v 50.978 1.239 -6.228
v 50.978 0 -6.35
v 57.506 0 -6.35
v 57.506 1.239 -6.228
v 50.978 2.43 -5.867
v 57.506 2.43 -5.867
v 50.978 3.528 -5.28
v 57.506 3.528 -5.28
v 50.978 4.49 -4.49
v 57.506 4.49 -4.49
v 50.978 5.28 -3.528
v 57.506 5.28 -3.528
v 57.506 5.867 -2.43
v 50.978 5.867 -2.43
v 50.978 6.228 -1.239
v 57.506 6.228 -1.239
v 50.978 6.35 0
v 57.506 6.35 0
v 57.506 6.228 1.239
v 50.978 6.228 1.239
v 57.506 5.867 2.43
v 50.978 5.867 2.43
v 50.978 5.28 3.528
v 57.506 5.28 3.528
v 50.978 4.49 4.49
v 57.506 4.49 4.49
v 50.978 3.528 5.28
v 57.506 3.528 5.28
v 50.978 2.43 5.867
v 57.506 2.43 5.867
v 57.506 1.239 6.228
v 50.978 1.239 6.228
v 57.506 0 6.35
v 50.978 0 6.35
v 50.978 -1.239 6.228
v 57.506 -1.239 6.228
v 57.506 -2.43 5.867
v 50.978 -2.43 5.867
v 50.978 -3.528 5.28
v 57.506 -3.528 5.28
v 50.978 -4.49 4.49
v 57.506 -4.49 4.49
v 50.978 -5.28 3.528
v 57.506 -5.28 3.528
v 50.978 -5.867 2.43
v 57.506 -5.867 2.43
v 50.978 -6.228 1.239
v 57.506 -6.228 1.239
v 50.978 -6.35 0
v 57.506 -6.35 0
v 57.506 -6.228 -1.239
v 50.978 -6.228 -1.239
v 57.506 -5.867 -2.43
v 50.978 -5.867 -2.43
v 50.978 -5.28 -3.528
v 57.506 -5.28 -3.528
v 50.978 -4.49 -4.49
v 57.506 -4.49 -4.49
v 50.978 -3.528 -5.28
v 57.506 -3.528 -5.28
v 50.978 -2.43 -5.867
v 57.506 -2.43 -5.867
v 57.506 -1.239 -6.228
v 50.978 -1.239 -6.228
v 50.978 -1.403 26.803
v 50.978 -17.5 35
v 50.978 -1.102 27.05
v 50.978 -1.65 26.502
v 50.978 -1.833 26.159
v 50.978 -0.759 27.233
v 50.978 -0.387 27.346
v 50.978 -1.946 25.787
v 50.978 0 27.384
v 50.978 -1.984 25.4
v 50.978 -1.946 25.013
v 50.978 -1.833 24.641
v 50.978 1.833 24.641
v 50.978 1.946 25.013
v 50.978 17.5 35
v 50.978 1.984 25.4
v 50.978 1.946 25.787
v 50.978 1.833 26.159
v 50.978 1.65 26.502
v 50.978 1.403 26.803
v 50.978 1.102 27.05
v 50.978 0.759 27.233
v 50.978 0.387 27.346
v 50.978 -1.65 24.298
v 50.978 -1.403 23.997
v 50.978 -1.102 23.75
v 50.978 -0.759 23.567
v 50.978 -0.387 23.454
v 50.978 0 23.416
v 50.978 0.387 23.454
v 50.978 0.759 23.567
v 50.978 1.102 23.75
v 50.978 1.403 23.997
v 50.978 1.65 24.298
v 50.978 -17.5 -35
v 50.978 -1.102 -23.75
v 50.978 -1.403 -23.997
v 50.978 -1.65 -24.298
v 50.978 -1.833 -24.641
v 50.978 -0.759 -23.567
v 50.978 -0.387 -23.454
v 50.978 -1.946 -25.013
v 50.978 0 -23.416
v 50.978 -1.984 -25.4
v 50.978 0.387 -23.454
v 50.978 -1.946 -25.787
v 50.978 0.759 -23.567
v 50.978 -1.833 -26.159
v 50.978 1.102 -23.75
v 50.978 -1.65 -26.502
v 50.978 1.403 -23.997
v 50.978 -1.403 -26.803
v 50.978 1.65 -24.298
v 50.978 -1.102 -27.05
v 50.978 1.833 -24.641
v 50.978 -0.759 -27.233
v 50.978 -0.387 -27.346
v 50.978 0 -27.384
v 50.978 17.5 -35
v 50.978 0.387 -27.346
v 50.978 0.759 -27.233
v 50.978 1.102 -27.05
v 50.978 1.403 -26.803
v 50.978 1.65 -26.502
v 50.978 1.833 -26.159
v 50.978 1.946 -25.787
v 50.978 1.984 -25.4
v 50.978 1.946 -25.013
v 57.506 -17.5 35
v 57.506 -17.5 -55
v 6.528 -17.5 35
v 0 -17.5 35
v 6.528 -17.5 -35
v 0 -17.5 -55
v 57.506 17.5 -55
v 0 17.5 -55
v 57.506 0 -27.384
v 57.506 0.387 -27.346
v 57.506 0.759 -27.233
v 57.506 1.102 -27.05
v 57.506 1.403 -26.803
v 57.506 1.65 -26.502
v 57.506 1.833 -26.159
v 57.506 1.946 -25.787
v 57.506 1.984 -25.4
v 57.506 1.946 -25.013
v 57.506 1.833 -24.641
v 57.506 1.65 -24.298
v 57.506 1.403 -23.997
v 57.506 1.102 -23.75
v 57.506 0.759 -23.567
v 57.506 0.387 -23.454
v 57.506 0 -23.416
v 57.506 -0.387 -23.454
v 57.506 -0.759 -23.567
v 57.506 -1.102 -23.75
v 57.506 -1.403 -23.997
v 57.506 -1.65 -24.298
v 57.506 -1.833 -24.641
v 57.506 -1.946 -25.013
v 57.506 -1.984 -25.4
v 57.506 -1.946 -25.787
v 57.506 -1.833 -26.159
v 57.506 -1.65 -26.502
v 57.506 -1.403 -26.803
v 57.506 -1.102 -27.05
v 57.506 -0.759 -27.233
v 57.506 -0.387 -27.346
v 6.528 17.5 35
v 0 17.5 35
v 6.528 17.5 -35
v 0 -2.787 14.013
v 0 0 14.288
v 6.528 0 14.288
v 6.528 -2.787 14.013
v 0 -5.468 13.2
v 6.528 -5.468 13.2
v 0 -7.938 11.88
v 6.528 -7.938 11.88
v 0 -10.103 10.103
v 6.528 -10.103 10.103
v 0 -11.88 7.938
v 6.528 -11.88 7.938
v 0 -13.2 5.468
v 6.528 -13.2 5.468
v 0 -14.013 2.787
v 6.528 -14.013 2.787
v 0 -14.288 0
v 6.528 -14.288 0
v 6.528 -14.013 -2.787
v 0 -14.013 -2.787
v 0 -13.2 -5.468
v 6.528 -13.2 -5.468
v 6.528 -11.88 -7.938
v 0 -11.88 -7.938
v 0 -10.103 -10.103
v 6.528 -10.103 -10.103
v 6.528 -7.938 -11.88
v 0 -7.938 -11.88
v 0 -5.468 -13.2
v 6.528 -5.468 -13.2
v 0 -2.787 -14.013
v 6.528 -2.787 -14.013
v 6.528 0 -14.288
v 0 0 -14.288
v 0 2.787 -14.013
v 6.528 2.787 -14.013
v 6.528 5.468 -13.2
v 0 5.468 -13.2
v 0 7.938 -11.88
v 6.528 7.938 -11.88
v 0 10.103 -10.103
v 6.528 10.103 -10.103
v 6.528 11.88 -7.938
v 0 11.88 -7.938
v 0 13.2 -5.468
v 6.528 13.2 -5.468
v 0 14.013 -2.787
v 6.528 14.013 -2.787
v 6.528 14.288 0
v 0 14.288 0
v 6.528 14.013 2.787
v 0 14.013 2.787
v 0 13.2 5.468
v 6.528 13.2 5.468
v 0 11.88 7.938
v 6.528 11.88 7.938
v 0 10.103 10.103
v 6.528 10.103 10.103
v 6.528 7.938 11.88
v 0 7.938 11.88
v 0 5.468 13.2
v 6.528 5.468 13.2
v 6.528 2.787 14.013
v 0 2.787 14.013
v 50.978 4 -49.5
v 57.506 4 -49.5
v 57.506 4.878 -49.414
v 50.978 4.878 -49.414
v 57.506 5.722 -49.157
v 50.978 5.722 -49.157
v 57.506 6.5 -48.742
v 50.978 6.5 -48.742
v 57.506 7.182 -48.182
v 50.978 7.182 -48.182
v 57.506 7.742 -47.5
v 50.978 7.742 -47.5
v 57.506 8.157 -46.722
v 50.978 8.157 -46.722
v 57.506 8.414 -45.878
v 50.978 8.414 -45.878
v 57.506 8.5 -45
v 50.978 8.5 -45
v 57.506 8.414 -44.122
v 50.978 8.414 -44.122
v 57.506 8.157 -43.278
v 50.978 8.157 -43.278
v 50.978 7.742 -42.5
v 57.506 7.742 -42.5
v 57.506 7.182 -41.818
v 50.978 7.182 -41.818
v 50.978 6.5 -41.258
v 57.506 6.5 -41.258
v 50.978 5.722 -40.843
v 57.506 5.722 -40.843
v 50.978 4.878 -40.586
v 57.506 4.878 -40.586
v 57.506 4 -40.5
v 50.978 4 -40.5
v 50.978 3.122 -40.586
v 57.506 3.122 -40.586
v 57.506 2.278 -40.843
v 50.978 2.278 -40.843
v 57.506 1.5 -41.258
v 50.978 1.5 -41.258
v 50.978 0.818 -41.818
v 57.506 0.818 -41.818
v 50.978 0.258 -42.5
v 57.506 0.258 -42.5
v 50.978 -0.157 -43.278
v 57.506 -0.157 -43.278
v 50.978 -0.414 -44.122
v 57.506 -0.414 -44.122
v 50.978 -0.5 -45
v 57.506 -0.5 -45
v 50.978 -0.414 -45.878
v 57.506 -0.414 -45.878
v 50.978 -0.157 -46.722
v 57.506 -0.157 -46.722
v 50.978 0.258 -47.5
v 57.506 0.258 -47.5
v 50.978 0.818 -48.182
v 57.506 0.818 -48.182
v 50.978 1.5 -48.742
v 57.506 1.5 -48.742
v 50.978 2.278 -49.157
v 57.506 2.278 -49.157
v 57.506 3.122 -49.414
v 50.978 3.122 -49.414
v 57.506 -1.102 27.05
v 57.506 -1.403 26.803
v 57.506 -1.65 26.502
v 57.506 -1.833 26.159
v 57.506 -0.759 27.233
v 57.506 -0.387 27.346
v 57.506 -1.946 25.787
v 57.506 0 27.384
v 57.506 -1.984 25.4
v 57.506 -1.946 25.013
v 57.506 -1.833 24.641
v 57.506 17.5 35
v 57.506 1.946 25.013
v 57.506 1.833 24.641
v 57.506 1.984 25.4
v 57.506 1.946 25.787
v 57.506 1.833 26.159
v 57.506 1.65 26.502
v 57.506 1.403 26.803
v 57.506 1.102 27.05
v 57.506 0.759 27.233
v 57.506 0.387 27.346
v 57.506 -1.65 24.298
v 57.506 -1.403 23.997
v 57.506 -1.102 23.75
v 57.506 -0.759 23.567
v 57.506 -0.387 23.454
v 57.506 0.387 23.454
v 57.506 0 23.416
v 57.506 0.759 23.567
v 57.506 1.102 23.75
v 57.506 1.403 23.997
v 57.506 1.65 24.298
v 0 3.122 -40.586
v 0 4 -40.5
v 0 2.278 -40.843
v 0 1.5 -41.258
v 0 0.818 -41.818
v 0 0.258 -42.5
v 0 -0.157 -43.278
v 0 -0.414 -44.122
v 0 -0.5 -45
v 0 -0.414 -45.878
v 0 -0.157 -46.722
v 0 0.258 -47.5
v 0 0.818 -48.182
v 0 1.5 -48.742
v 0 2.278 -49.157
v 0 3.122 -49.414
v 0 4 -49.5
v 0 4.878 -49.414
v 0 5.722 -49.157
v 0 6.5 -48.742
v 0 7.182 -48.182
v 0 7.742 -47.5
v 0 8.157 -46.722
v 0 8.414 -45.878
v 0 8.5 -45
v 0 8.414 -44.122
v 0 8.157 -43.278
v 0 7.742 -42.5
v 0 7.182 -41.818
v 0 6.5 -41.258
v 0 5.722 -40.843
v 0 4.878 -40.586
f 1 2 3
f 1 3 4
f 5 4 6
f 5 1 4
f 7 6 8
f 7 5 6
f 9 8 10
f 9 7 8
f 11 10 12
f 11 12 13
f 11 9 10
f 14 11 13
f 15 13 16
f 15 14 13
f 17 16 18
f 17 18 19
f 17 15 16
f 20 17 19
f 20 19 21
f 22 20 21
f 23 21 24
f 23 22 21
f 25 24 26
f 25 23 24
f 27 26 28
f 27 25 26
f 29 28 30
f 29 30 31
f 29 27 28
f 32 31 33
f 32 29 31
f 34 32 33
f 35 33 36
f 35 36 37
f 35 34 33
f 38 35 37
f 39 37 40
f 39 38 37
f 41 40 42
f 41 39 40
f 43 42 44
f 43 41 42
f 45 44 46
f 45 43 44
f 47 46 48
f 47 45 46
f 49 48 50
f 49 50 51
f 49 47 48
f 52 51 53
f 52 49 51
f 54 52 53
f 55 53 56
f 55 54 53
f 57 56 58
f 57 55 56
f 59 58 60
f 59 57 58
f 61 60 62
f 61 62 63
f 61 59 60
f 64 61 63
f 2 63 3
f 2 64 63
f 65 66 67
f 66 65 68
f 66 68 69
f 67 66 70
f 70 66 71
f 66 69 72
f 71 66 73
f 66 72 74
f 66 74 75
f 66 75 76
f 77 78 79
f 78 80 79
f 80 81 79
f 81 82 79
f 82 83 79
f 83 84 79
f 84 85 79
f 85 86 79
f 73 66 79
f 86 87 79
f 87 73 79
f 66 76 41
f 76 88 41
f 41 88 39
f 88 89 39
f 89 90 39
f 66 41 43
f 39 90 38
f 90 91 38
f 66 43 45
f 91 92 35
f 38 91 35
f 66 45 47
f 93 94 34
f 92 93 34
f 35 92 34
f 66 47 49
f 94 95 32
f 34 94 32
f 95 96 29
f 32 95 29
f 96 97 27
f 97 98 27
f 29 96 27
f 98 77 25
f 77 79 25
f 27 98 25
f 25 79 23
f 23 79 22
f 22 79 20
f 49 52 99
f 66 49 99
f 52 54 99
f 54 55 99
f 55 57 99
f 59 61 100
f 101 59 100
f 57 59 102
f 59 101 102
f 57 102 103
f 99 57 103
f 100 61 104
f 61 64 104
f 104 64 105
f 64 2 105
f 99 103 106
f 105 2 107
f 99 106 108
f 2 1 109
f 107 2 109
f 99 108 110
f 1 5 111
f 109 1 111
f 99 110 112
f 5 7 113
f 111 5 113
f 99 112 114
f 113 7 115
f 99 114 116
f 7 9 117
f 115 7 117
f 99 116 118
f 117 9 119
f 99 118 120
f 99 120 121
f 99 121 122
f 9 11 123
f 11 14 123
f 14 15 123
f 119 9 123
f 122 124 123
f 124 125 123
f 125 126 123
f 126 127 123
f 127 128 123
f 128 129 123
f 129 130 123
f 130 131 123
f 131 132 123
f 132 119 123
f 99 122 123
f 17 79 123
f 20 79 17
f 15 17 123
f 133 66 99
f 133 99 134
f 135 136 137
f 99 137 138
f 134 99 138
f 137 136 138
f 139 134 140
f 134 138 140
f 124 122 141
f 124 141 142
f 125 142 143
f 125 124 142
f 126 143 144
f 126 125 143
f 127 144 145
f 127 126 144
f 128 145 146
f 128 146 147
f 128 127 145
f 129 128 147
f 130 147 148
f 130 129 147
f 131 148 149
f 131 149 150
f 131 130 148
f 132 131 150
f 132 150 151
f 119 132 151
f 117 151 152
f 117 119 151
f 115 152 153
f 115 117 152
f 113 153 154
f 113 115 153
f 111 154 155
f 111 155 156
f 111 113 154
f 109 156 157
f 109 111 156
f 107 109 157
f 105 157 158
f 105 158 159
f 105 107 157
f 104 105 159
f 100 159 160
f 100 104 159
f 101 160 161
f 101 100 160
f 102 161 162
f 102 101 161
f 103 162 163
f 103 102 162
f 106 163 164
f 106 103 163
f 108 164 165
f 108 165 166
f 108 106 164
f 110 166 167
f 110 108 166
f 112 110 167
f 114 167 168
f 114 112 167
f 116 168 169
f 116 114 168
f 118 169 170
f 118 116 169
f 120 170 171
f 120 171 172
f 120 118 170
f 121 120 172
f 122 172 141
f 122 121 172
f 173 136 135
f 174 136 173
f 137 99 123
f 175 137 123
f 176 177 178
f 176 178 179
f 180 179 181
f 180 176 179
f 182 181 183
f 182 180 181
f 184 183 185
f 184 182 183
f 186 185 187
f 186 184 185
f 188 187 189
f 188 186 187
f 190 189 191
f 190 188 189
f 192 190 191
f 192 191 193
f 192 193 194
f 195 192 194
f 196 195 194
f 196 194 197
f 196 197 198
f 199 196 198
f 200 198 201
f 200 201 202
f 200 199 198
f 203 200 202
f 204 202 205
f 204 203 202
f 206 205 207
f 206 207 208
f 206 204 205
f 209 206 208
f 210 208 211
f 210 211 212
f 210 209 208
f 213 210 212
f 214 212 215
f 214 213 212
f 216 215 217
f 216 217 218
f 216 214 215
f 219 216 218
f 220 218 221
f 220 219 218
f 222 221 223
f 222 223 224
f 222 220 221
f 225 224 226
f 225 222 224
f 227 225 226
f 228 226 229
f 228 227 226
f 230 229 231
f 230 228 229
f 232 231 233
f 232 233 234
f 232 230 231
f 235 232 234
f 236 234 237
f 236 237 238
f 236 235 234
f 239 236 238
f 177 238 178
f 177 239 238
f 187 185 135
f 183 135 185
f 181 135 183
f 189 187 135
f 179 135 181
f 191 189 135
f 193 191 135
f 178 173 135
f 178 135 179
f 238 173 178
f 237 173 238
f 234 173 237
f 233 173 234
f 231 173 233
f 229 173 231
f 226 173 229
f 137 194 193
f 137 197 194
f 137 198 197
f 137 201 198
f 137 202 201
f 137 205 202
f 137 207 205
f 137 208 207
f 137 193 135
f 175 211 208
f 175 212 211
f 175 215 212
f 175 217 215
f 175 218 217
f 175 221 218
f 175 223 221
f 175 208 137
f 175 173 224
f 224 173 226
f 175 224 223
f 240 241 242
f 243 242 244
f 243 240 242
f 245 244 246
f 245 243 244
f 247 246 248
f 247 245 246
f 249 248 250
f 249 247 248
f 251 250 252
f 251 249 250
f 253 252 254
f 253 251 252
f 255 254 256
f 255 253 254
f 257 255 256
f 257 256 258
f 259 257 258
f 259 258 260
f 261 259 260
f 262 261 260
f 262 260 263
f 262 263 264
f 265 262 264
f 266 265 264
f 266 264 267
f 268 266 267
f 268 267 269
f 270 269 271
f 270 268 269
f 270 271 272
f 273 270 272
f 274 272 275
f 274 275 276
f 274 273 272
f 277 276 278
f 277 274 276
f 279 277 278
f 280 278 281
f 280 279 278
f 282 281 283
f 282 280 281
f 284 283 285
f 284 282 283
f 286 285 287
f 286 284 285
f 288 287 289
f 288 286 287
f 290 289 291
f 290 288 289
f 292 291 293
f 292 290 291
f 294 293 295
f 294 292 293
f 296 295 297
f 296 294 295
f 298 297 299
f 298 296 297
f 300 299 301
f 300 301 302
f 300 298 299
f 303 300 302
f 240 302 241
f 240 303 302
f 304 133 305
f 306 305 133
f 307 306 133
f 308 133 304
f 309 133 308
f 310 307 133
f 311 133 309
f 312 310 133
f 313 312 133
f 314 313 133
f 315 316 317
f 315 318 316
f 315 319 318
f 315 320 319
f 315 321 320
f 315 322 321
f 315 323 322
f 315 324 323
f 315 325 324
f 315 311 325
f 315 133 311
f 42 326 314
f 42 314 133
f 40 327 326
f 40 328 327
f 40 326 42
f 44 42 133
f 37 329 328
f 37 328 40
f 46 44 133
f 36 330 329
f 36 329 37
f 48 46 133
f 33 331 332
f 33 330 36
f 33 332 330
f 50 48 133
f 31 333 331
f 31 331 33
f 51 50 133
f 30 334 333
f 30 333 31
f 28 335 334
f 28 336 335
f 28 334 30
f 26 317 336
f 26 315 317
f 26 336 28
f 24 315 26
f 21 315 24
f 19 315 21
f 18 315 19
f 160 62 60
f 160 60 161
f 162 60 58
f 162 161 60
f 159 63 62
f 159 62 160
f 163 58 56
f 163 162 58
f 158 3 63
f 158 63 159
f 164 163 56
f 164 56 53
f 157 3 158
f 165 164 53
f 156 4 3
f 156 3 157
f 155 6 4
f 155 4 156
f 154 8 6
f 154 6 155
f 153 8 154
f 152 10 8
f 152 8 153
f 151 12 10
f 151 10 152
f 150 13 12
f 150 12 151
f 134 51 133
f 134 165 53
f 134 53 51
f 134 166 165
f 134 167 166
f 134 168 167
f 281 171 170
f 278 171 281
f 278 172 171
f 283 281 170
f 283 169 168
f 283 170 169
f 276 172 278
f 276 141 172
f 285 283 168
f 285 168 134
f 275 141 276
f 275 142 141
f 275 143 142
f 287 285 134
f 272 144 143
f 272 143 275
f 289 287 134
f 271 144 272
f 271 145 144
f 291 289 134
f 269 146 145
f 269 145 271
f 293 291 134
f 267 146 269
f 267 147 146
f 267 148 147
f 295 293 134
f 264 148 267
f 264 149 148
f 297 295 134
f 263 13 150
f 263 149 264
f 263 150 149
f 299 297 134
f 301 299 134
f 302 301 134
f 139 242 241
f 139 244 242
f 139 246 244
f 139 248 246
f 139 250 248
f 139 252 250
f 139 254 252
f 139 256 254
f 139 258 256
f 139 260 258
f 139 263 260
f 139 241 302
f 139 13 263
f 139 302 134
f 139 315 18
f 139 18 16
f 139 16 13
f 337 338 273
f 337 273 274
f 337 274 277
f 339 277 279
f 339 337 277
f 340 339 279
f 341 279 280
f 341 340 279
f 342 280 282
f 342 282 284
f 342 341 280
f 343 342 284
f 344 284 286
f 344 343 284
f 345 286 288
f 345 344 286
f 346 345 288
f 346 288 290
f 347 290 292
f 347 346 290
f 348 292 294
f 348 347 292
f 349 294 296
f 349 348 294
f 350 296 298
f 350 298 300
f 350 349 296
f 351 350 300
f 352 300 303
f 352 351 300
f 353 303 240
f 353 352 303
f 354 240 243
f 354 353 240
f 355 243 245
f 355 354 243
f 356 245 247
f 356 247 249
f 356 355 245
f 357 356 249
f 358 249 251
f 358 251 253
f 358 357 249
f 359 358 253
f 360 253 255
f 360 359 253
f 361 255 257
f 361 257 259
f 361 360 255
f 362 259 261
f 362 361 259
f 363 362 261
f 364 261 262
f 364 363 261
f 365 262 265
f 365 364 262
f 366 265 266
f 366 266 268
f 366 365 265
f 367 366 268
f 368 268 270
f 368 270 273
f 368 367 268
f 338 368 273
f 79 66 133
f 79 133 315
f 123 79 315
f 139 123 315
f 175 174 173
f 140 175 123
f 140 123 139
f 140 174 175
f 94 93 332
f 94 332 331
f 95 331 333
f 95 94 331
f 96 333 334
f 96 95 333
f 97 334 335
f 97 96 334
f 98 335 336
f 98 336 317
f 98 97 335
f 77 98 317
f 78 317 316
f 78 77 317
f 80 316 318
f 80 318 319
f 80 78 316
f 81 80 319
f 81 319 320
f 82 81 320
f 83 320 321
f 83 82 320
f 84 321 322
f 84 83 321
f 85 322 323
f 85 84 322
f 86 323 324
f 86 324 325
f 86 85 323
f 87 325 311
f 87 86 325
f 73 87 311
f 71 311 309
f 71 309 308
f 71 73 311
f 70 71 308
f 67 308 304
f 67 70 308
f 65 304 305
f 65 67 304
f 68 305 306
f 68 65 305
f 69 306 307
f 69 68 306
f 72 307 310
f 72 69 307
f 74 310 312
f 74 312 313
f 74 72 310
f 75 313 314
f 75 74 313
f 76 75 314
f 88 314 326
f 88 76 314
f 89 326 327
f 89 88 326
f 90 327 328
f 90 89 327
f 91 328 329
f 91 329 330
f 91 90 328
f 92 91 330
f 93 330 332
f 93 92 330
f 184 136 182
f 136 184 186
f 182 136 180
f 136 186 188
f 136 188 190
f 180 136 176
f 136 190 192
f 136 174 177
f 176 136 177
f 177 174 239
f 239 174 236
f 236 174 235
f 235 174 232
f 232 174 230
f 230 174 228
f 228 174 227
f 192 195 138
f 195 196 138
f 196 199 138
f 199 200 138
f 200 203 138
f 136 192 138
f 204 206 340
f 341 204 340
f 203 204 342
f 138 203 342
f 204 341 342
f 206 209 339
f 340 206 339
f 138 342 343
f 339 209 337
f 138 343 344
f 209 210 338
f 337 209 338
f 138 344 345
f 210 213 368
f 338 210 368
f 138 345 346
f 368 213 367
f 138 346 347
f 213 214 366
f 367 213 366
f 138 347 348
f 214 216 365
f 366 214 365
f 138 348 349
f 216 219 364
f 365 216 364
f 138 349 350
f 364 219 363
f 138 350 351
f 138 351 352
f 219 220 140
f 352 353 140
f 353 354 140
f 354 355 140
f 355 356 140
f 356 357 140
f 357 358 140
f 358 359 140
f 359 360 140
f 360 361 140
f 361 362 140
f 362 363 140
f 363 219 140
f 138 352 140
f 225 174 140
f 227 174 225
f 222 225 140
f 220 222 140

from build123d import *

# Parameters (mm, degrees)
SKETCH1_W           = 90
SKETCH1_H           = 35
SKETCH1_R           = 14.2875
SKETCH1_R_2         = 4.5
BOSS_EXTRUDE1_DEPTH = 6.5278
SKETCH2_W           = 20
SKETCH2_H           = 35
SKETCH2_R           = 4.5
BOSS_EXTRUDE2_DEPTH = 44.45
SKETCH3_R           = 1.984375
SKETCH3_R_2         = 4.5
BOSS_EXTRUDE3_DEPTH = 6.5278


with BuildPart() as part:
    # Sketch1 → Boss-Extrude1 (new body)
    with BuildSketch(Plane(origin=(0, 0, 0), x_dir=(0, 0, -1), z_dir=(1, 0, 0))):
        with Locations((10, 0)):
            Rectangle(SKETCH1_W, SKETCH1_H)
        Circle(SKETCH1_R, mode=Mode.SUBTRACT)
        with Locations((45, 4)):
            Circle(SKETCH1_R_2, mode=Mode.SUBTRACT)
    extrude(amount=BOSS_EXTRUDE1_DEPTH)

    # Sketch2 → Boss-Extrude2 (add)
    with BuildSketch(Plane(origin=(6.5278, 0, 0), x_dir=(0, 0, -1), z_dir=(1, 0, 0))):
        with Locations((45, 0)):
            Rectangle(SKETCH2_W, SKETCH2_H)
        with Locations((45, 4)):
            Circle(SKETCH2_R, mode=Mode.SUBTRACT)
    extrude(amount=BOSS_EXTRUDE2_DEPTH)

    # Sketch3 → Boss-Extrude3 (add)
    with BuildSketch(Plane(origin=(50.9778, 0, 0), x_dir=(0, 0, -1), z_dir=(1, 0, 0))):
        Polygon((-35, 17.5), (-35, 0), (-35, -17.5), (55, -17.5), (55, 17.5), align=None)
        with BuildLine():
            ThreePointArc((-27.384375, 0), (-25.4, 1.984375), (-23.415625, 0))
            ThreePointArc((-23.415625, 0), (-25.4, -1.984375), (-27.384375, 0))
        make_face(mode=Mode.SUBTRACT)
        with BuildLine():
            ThreePointArc((6.35, 0), (0, -6.35), (-6.35, 0))
            ThreePointArc((-6.35, 0), (0, 6.35), (6.35, 0))
        make_face(mode=Mode.SUBTRACT)
        with Locations((25.4, 0)):
            Circle(SKETCH3_R, mode=Mode.SUBTRACT)
        with Locations((45, 4)):
            Circle(SKETCH3_R_2, mode=Mode.SUBTRACT)
    extrude(amount=BOSS_EXTRUDE3_DEPTH)


solid = part.part
